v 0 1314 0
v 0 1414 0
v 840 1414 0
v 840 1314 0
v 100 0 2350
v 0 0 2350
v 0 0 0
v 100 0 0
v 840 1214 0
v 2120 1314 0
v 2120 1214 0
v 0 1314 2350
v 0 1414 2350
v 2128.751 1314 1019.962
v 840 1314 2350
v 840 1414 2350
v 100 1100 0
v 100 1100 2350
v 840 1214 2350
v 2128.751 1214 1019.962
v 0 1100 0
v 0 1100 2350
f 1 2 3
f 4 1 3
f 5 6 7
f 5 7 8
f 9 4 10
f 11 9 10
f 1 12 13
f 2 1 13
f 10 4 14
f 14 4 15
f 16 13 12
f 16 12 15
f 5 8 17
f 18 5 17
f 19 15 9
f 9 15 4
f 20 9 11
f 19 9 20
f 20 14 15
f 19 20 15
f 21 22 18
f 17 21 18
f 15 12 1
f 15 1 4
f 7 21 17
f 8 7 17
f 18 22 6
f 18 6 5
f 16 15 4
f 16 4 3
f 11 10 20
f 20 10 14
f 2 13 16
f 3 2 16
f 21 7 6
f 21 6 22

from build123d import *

# Parameters (mm, degrees)
F0_W     = 100
F0_H     = 1100
F1_DEPTH = 2350
F2_W     = 840
F2_H     = 100
F3_DEPTH = 2350
F5_DEPTH = 100


with BuildPart() as f1:
    # F0 (on Top) → F1 (new body)
    with BuildSketch(Plane.XY):
        with Locations((50, 550)):
            Rectangle(F0_W, F0_H)
    extrude(amount=F1_DEPTH)


with BuildPart() as f3:
    # F2 (on Top) → F3 (new body)
    with BuildSketch(Plane.XY):
        with Locations((420, 1364.000063)):
            Rectangle(F2_W, F2_H)
    extrude(amount=F3_DEPTH)


with BuildPart() as f5:
    # F4 (on face) → F5 (new body)
    with BuildSketch(Plane.XZ.offset(-1314.000063)):
        Polygon((2128.750702, 1019.962463), (840, 2350), (840, 0), (2120, 0), align=None)
    extrude(amount=F5_DEPTH)


solid = Compound([f1.part, f3.part, f5.part])
